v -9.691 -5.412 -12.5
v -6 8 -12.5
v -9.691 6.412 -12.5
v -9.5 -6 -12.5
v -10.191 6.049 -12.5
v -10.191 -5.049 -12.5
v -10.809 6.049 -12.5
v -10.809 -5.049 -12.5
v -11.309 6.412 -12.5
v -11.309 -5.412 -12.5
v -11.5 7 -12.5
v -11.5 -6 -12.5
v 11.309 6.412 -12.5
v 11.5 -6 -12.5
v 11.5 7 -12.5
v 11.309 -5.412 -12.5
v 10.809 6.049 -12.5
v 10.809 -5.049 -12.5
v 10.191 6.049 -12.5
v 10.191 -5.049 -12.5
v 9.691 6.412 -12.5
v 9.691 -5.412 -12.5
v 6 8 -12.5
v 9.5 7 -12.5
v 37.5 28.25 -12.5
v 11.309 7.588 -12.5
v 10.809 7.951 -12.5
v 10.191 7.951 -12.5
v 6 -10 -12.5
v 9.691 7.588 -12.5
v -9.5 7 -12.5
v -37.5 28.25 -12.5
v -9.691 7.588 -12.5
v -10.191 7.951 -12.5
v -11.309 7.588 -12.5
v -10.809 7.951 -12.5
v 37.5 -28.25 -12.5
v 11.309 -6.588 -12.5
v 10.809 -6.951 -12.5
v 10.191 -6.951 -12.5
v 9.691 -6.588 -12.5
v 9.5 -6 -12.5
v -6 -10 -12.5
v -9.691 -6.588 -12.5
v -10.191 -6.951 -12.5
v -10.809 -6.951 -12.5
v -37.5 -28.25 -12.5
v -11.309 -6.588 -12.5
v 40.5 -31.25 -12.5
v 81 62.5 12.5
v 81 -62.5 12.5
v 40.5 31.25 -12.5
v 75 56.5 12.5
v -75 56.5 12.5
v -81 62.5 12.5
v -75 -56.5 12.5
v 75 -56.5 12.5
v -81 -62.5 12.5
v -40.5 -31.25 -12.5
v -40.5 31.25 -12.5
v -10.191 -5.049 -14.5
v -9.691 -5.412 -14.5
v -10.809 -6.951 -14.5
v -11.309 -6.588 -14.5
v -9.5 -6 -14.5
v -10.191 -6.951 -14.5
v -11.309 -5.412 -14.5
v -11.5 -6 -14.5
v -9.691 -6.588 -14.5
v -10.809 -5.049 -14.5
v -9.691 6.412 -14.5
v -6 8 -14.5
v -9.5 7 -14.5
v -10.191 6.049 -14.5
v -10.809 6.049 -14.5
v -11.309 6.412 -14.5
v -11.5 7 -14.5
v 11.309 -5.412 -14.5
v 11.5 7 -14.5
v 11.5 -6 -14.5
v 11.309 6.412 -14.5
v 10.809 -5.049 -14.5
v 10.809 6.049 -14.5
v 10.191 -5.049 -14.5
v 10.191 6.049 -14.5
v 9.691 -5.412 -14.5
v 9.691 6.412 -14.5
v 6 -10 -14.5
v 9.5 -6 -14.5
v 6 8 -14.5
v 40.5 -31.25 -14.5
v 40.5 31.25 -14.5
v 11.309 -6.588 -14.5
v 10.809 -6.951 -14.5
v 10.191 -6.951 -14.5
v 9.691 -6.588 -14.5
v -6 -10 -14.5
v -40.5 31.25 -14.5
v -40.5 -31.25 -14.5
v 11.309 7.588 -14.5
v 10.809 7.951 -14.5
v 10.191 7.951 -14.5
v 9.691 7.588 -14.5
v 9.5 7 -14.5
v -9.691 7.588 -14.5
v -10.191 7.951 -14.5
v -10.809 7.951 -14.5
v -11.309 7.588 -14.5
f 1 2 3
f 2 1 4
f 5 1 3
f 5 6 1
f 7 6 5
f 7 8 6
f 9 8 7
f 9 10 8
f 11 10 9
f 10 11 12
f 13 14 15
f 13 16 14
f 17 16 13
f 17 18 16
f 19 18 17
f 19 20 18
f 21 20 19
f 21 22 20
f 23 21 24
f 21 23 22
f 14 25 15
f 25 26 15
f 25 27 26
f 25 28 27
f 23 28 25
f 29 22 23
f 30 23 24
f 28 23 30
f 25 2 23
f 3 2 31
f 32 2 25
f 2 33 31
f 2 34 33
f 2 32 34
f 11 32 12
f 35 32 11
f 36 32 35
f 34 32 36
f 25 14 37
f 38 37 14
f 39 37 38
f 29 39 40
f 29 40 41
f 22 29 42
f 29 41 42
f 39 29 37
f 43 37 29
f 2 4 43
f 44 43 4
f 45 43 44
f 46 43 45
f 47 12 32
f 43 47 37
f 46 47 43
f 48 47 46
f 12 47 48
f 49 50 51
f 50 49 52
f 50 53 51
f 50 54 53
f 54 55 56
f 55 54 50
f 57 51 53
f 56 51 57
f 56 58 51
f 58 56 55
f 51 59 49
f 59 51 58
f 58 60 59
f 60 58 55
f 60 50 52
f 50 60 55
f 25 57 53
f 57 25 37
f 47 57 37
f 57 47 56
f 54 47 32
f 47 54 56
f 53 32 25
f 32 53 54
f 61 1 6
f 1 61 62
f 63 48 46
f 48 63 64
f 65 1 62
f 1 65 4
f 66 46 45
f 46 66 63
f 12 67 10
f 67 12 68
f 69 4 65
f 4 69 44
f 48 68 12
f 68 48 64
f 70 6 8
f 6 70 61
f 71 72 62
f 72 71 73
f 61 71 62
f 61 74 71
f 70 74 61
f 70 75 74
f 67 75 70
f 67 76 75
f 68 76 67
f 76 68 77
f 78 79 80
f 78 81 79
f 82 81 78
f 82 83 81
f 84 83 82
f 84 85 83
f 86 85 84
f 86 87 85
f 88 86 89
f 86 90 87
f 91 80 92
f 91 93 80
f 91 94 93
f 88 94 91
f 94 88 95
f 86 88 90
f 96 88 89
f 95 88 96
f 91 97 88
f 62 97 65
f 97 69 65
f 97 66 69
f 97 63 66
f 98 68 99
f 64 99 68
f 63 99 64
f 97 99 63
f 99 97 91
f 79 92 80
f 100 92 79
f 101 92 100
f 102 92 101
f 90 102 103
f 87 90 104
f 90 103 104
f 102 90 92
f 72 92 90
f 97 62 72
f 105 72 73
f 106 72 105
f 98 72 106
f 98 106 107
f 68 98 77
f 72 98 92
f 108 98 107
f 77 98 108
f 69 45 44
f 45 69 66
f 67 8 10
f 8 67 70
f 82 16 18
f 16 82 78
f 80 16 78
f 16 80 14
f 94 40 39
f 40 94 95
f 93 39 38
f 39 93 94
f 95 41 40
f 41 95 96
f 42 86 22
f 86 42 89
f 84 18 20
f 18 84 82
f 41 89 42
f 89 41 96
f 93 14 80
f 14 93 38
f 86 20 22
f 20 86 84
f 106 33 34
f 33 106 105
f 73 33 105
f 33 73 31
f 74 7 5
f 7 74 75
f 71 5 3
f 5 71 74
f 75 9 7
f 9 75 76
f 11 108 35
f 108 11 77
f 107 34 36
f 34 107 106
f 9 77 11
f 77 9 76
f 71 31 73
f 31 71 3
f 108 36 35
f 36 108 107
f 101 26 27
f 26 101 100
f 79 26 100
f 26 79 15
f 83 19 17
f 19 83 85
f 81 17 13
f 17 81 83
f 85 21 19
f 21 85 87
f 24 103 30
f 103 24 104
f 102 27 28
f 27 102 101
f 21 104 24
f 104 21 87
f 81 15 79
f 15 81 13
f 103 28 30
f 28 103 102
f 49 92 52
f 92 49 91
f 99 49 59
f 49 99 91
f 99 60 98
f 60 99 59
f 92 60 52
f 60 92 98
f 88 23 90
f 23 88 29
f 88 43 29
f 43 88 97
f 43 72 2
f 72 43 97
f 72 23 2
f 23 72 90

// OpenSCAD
/*


    Halterung für Raspi-Kamera in Strahlergehäuse

    14.02.2017  Initial version
    17.12.2017  Variante für kleines Gehäuse
    18.12.2017  Anpassungen und Optimierungen (Dicke, Tiefe)
    
    
*/

// Auflösung anpassen
//
$fn = 400;
$fn = 10;

// Welches Modell?
//
zoom=false;

// Materialstärke
//
dicke = 6;

// Parameter für großes Gehäuse
//
x_size=81;
y_size=62.5;
tiefe = 25;
skala=2;

// Parameter für kleines Gehäuse
//
/*
x_size=59.5;
y_size=40.5;
tiefe = 5;
skala=2;
*/

module Huelse()
{
    linear_extrude(tiefe, scale = skala, center = true)
    {
        offset(0)
        {
            translate([-x_size/2, -y_size/2, 0])
            square([x_size, y_size], 0);
        }
    }
}

module Innenhuelse()
{
    linear_extrude(tiefe, scale = skala, center = true)
    {
        offset(0)
        {
            translate([(-x_size+dicke)/2, (-y_size+dicke)/2, 0])
            square([x_size-dicke, y_size-dicke], 0);
        }
    }
}

hoehe=-tiefe/2-2;

module Box()
{
    translate([-(x_size)/2, -(y_size)/2, hoehe])
    linear_extrude(2)
    {
        offset(0)
        {
            square([x_size, y_size], 0);
        }
    }
}

module Innenbox()
{
    if (!zoom)
    {
        translate([-(12)/2, -10, hoehe])
        linear_extrude(3)
        {
            offset(0)
            {
                square([12, 18], 0);
            }
        }
    }
}

module Zoomloch()
{
    if (zoom)
    {
     translate([-14/2, -1, hoehe])
    
     linear_extrude(3)
     {
         square([14,14]);
     }

     // Linsenbalken
     //
     translate([-23/2, 3.5, hoehe])
    
     linear_extrude(3)
     {
         square([23,5.5]);
     }
    }
}
module Steckerleiste()
{
    // Unteres Loch für die Steckerleiste
    //
    if (zoom)
    {
     translate([-23/2, -10, hoehe])
    
     linear_extrude(3)
     {
         square([23,7]);
     }
    }
}

module Schraubloecher()
{
    // Untere
    //
    if (!zoom)
    {
        translate([-21/2, -6, hoehe])
    
        linear_extrude(3)
        {
            circle(1);
        }

        translate([+21/2, -6, hoehe])
    
        linear_extrude(3)
        {
            circle(1);
        }
    }
    else
    {
        translate([-21/2, -1, hoehe])
    
        linear_extrude(3)
        {
            circle(1);
        }

        translate([+21/2, -1, hoehe])
    
        linear_extrude(3)
        {
            circle(1);
        }
    }
        
    // Obere
    //
    if (!zoom)
    {
        translate([-21/2, 7, hoehe])
        linear_extrude(3)
        {
            circle(1);
        }
    }
    else
    {
        translate([-21/2, 13, hoehe])
        linear_extrude(3)
        {
            circle(1);
        }
    }

    if (!zoom)
    {
        translate([+21/2, 7, hoehe])
        linear_extrude(3)
        {
            circle(1);
        }
    }
    else
    {
        translate([+21/2, 13, hoehe])
        linear_extrude(3)
        {
            circle(1);
        }
    }
}

difference()
{
    Huelse();
    Innenhuelse();
}

difference()
{
    Box();
    
    Schraubloecher();
    
    Zoomloch();
    Steckerleiste();
    
    Innenbox();
}
